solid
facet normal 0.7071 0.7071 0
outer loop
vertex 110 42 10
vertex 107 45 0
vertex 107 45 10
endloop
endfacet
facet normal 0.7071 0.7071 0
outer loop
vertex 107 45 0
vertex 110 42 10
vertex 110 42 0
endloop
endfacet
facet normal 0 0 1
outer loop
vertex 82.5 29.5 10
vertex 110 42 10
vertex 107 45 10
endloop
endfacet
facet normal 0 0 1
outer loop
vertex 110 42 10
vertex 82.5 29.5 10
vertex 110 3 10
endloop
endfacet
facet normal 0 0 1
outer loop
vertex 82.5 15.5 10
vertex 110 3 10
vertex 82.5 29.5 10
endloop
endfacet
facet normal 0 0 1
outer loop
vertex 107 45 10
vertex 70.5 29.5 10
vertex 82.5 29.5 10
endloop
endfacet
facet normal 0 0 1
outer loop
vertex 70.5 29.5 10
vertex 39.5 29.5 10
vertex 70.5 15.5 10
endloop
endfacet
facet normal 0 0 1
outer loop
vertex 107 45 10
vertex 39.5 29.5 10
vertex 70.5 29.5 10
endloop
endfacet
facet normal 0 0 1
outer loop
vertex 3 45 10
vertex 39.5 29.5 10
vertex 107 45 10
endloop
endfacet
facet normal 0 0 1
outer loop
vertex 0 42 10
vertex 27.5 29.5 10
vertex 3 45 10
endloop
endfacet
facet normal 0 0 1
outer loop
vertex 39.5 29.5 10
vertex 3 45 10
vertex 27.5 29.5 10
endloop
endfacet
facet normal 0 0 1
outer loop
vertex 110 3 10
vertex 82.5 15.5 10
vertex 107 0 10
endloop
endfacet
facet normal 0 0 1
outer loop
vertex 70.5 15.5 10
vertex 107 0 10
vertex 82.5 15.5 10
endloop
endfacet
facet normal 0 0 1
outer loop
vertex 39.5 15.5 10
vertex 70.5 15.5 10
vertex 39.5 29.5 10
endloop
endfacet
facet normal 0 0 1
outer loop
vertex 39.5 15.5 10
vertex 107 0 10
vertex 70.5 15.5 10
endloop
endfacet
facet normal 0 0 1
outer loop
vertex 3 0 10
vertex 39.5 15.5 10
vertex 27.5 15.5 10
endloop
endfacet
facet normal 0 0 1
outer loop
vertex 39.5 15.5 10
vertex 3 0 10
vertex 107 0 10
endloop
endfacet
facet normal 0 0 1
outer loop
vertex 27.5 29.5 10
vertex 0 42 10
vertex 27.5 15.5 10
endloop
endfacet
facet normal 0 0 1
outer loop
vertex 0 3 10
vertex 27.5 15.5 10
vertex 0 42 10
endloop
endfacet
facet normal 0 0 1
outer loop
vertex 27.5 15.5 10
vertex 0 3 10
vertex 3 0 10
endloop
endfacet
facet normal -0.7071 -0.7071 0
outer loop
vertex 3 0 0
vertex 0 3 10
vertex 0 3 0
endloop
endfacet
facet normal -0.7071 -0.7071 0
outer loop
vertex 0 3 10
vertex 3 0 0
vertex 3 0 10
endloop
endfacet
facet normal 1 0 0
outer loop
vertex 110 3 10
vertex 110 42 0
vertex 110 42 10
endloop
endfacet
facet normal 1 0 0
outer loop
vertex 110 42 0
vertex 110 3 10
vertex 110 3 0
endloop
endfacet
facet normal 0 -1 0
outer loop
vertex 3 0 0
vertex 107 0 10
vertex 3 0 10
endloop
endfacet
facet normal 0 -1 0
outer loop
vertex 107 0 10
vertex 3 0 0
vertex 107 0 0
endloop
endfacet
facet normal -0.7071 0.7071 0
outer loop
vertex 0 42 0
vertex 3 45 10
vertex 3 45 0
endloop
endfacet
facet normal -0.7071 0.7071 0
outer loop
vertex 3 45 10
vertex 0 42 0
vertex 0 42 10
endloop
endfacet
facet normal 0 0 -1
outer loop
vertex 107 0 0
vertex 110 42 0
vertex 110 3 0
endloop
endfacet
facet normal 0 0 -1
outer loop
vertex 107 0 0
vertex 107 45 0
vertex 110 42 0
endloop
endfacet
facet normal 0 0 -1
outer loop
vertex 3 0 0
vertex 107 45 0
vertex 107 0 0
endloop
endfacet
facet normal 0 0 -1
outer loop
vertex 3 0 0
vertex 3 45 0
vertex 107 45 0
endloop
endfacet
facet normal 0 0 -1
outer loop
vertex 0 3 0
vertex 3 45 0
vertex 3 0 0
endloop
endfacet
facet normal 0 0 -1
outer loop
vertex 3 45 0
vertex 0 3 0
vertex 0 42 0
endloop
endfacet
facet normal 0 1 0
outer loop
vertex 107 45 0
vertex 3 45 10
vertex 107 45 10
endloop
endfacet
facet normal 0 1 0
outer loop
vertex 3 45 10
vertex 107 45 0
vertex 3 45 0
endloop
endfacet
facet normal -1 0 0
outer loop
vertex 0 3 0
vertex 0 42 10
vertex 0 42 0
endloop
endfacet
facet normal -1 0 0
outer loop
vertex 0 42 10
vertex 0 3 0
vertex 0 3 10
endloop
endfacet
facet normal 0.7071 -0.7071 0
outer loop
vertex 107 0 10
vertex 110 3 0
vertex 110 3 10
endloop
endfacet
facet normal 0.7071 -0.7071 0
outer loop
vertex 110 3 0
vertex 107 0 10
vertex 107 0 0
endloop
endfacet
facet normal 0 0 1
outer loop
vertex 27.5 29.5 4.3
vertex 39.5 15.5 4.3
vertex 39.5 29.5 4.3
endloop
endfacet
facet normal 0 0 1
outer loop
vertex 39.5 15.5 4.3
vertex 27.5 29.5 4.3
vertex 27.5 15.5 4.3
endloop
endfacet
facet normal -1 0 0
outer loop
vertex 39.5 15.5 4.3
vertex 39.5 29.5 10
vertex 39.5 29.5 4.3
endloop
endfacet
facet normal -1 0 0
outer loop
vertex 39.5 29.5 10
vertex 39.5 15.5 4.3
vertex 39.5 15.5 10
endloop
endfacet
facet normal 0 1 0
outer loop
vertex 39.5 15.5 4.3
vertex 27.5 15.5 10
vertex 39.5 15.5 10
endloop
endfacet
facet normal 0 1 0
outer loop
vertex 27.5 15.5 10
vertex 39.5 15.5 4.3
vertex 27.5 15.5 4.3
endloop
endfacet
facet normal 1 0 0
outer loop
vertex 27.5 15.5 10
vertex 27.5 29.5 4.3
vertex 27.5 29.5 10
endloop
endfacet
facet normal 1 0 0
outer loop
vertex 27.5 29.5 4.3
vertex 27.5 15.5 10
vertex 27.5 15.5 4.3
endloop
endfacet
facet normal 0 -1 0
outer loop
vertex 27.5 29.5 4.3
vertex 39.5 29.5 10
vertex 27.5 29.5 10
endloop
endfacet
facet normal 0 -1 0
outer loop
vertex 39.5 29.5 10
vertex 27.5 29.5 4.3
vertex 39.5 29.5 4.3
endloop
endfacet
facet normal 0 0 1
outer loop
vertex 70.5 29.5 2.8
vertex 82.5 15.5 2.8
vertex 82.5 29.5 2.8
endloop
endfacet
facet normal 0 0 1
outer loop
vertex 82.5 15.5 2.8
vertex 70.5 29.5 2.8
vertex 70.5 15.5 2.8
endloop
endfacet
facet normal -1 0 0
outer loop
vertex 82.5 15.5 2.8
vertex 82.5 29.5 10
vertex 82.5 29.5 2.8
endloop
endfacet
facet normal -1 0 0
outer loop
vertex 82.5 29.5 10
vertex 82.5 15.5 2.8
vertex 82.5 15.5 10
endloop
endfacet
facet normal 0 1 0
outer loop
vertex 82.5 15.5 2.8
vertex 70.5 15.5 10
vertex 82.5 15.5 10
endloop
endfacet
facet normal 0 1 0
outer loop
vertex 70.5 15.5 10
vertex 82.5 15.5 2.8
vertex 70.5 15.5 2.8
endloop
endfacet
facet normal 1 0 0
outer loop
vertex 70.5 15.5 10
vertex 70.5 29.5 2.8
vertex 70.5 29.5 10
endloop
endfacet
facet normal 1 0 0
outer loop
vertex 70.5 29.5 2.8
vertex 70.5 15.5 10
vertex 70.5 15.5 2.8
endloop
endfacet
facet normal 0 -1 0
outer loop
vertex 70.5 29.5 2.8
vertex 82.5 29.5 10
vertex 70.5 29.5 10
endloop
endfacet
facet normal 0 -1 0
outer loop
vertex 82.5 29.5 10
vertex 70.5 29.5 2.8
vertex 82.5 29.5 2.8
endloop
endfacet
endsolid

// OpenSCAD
$fn = 32;

// ----------------------------------------------------------------------
// Windowed plate: 2 voids, 110 x 45 x 10 mm
// ----------------------------------------------------------------------

// --- parameters (mm) ---
plate_l = 110;            // plate length, X
plate_w = 45;             // plate width, Y
plate_t = 10;             // plate thickness, Z
edge_margin = 12;         // wall from the plate edge to any window
windows = 2;              // number of windows in the row
win_l = 12;               // window length
win_w = 14;               // window width
win_pitch = 43;           // window pitch along X
depth_1 = 5.7;            // depth of void 1 (full thickness = through)
depth_2 = 7.2;            // depth of void 2 (full thickness = through)
corner_c = 3;             // corner chamfer of the plate

profile = [[3, 0], [107, 0], [110, 3], [110, 42], [107, 45], [3, 45], [0, 42], [0, 3]];  // primary outline, 8 points, counter clockwise
void_1 = [[27.5, 15.5], [39.5, 15.5], [39.5, 29.5], [27.5, 29.5]];  // window 1 of the row, 4 points
void_2 = [[70.5, 15.5], [82.5, 15.5], [82.5, 29.5], [70.5, 29.5]];  // window 2 of the row, 4 points

// --- the one profile operation ---
difference() {
  linear_extrude(height = plate_t) polygon(points = profile);
  translate([0, 0, plate_t - depth_1])
    linear_extrude(height = depth_1 + 1) polygon(points = void_1);
  translate([0, 0, plate_t - depth_2])
    linear_extrude(height = depth_2 + 1) polygon(points = void_2);
}
